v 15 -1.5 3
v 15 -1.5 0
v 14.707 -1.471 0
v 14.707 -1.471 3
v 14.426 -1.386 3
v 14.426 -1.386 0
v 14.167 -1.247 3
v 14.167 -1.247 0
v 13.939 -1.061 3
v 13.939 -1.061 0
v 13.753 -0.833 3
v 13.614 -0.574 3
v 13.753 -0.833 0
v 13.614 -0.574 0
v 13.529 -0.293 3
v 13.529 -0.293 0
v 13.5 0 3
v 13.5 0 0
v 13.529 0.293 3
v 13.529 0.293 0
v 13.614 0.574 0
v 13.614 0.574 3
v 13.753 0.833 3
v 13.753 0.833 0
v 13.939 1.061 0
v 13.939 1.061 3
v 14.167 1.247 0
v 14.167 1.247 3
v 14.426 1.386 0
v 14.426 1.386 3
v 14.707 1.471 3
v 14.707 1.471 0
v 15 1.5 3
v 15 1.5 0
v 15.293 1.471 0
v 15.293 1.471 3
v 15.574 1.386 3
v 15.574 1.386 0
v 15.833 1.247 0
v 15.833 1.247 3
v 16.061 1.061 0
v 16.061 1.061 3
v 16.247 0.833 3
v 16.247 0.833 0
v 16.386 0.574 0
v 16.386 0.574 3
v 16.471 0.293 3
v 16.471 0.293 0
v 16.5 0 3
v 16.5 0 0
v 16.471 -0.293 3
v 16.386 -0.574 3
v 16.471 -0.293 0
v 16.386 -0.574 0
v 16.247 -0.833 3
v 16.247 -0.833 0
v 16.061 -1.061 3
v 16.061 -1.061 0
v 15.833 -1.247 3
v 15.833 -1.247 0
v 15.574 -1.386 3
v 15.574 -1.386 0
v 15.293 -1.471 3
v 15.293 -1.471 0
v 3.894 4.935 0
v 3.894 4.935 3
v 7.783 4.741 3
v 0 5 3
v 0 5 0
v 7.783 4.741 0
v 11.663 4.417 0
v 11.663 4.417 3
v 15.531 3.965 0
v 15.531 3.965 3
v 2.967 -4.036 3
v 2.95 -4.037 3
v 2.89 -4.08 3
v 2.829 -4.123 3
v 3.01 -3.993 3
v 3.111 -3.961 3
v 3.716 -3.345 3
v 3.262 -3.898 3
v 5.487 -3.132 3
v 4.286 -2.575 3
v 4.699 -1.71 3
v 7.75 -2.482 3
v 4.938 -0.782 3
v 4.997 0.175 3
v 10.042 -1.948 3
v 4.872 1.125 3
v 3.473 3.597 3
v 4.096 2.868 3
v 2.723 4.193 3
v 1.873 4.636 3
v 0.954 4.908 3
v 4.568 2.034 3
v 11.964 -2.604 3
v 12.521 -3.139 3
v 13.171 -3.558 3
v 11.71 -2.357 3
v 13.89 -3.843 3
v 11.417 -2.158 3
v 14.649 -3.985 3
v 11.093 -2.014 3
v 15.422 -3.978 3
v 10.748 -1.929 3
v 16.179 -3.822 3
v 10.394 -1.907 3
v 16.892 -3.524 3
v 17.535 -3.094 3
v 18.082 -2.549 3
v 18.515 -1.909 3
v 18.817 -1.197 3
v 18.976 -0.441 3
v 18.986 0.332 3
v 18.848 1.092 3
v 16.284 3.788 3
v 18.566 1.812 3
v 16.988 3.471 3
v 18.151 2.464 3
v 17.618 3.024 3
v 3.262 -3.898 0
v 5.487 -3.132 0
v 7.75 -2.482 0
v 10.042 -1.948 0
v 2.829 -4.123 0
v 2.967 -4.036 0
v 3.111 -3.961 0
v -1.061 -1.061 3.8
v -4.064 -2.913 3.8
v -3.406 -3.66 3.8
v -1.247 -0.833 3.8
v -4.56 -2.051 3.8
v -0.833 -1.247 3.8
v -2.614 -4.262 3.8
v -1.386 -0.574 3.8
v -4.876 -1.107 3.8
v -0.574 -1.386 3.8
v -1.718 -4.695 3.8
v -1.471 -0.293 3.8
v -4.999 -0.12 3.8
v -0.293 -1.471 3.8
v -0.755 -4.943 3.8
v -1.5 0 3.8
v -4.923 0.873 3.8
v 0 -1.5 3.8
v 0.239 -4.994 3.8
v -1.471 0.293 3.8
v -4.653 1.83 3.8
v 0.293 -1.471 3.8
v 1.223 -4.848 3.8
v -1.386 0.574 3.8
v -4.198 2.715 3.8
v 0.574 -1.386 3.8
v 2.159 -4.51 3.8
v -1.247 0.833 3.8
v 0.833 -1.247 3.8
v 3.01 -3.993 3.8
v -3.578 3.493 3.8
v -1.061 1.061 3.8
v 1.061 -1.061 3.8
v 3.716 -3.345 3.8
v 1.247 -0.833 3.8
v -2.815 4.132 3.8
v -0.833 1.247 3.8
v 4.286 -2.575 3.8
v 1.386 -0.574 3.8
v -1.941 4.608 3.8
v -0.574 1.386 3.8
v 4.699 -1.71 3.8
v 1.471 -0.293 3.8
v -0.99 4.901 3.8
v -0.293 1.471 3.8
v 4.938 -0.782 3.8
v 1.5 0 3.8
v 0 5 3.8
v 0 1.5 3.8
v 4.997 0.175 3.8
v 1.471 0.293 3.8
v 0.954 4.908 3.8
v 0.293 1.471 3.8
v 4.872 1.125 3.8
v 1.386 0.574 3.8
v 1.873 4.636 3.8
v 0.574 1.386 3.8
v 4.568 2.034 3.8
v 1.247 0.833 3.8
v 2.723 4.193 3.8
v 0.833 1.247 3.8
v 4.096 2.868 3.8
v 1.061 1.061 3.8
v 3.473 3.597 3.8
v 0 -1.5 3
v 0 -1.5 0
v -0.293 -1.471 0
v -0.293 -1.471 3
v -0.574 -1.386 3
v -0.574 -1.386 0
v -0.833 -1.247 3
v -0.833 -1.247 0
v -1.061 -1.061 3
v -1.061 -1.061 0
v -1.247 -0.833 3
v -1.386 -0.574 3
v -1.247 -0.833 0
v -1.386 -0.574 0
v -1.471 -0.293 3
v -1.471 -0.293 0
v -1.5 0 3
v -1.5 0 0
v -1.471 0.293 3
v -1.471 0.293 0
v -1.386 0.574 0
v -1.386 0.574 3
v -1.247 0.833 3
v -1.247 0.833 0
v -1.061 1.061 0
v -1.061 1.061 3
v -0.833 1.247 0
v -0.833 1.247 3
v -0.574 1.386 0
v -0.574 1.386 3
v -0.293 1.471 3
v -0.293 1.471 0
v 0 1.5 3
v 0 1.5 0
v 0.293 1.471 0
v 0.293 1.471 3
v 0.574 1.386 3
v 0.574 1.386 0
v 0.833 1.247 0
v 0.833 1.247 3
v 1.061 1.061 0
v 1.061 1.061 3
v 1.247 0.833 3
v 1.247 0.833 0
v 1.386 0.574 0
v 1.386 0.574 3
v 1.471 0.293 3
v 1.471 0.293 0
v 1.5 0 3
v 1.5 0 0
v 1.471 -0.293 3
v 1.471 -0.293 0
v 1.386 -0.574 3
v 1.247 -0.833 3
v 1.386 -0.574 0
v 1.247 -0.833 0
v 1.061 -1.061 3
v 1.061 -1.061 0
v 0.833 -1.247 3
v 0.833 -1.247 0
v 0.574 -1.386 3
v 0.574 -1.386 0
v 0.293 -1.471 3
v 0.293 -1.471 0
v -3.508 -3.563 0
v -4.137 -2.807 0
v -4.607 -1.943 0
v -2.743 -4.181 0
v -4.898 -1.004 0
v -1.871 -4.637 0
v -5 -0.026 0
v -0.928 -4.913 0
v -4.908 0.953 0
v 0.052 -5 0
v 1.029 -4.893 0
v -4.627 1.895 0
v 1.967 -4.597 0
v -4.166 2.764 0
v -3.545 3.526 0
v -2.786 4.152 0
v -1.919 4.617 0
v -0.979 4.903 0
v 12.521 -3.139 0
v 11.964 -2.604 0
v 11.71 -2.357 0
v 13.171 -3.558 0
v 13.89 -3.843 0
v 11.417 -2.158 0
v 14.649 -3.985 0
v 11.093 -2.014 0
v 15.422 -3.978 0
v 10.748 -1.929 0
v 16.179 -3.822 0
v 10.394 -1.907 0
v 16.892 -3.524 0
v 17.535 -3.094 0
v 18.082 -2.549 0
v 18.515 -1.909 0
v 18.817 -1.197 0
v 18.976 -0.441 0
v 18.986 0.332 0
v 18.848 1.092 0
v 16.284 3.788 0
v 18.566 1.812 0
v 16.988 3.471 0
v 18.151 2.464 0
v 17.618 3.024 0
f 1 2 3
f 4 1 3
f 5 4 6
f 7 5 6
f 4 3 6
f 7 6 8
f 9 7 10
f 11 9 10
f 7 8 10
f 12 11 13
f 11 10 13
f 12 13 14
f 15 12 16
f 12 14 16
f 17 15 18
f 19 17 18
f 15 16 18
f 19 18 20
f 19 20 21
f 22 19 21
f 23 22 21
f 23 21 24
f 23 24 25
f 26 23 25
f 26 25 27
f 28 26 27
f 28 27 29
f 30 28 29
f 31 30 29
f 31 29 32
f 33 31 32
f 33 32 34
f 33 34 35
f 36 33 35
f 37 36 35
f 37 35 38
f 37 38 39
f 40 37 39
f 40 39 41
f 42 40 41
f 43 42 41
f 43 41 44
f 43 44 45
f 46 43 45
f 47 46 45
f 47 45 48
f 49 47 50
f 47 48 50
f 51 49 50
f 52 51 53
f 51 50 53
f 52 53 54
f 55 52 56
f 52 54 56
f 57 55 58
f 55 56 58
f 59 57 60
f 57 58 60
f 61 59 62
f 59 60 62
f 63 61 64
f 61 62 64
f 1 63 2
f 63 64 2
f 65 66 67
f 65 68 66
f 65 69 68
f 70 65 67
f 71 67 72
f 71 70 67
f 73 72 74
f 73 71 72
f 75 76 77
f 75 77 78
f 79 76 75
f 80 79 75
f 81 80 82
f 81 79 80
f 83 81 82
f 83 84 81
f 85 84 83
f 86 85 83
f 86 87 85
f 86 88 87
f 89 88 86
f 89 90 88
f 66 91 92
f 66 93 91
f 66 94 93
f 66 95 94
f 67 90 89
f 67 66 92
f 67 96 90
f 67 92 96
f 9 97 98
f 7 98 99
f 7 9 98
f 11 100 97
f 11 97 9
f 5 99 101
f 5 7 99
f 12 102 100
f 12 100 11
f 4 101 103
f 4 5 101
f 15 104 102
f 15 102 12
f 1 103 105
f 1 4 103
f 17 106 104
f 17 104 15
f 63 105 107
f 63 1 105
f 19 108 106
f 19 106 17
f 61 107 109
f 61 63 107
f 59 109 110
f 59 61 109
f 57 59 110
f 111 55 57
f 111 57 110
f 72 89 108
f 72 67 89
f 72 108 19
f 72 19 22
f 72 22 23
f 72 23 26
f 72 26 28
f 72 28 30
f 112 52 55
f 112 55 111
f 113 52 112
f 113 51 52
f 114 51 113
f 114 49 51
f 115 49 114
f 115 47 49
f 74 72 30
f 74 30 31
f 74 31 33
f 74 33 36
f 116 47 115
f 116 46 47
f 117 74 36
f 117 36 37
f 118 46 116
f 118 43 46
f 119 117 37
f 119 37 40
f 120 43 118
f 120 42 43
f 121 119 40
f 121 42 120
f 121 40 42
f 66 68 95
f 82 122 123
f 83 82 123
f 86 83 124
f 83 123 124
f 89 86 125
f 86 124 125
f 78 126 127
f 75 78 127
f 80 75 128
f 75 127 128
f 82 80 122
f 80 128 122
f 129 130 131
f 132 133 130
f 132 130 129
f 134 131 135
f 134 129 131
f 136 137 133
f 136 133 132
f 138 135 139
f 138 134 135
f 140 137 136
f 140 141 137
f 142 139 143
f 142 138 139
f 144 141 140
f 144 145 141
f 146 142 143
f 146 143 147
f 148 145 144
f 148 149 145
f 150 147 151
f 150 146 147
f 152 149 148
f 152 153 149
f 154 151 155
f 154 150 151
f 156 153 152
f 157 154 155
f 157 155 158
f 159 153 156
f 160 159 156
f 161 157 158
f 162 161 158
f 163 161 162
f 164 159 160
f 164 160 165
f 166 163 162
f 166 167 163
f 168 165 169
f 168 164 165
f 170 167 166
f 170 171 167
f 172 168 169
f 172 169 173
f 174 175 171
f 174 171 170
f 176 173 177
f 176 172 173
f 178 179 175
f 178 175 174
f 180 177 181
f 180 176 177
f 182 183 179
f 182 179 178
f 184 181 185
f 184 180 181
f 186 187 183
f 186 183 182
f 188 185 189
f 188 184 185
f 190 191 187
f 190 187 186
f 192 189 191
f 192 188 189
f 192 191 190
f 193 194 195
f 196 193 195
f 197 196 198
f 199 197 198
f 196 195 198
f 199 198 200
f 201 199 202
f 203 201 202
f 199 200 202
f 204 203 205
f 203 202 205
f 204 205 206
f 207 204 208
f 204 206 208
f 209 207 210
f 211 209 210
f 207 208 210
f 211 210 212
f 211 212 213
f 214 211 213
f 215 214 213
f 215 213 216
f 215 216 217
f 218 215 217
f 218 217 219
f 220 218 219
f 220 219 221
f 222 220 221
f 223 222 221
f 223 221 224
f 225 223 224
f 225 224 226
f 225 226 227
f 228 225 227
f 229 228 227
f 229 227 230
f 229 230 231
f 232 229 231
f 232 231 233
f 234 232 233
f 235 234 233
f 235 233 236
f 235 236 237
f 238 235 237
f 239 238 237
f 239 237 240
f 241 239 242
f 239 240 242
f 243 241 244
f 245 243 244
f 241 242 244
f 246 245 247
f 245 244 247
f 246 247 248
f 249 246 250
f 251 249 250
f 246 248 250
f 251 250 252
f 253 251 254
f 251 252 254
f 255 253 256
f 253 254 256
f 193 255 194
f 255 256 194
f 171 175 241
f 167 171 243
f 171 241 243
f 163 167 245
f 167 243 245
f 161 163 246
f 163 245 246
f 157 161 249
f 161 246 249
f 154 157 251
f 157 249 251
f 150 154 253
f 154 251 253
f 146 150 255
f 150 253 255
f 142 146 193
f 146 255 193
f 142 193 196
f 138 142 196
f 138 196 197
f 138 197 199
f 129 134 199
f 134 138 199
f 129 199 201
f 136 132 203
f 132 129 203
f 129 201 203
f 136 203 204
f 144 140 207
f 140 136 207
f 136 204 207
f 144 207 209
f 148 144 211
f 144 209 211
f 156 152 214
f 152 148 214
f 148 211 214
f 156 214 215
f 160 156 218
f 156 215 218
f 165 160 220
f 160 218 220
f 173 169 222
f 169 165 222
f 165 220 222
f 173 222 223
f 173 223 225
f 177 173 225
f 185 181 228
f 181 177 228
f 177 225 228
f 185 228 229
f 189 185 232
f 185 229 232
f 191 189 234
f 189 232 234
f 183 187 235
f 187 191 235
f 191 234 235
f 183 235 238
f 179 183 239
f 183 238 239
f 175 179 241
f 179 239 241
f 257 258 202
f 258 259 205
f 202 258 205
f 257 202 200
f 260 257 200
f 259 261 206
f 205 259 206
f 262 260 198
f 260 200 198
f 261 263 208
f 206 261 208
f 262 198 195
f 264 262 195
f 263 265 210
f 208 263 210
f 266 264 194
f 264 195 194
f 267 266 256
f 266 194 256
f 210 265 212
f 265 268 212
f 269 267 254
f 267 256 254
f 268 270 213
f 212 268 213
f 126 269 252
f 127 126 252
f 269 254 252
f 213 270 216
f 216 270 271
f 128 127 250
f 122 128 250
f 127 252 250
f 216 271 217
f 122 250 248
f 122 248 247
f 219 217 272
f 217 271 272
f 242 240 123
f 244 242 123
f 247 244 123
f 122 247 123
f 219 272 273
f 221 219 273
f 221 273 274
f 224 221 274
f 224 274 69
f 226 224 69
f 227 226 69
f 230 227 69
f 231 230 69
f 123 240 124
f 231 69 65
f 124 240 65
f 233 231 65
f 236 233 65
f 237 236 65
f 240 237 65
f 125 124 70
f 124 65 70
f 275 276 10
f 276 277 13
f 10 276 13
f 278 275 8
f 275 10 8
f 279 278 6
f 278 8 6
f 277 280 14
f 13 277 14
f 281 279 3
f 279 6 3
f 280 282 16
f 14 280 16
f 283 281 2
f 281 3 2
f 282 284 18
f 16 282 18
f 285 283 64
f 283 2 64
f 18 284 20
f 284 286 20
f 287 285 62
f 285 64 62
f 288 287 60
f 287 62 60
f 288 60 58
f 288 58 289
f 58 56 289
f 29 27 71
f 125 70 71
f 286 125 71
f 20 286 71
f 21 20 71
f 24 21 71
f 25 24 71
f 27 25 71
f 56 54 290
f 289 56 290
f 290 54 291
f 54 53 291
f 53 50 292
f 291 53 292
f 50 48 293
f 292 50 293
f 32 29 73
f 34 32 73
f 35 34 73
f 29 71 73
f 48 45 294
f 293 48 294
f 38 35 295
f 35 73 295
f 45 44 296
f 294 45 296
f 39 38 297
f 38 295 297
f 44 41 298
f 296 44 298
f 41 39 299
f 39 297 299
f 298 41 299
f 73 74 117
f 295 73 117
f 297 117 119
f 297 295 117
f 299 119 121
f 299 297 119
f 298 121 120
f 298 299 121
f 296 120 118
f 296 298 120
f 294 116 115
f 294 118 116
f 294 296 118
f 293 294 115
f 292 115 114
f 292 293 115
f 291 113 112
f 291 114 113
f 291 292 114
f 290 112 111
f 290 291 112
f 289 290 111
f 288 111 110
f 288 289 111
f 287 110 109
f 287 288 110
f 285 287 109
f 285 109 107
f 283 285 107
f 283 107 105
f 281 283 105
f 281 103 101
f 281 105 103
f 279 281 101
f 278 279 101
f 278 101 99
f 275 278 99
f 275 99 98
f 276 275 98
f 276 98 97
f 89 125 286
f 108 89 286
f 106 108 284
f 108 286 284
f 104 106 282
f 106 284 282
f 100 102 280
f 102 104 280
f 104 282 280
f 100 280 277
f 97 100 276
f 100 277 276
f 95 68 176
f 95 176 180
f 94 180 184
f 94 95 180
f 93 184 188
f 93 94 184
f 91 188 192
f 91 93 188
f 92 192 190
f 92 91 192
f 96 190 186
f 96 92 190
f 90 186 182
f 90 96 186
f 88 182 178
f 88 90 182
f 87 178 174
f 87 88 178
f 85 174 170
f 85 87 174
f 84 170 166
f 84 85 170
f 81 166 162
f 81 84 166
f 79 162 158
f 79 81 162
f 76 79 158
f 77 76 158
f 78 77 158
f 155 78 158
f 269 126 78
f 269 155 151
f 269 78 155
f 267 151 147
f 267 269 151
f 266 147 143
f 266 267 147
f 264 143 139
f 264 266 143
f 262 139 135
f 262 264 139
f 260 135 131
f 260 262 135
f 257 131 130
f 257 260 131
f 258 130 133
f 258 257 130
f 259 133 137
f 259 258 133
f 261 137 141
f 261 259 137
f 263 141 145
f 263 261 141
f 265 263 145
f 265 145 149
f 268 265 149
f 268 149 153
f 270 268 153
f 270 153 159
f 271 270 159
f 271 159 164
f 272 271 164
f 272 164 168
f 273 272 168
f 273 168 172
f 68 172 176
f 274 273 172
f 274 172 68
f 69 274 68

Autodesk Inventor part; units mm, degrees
ref_plane "YZ Plane" through (0, 0, 0) normal (1, 0, 0) x (0, 1, 0)
ref_plane "XZ Plane" through (0, 0, 0) normal (0, 1, 0) x (-1, 0, 0)
ref_plane "XY Plane" through (0, 0, 0) normal (0, 0, 1) x (1, 0, 0)
sketch "Skizze1" plane through (0, 0, 0) normal (0, 0, 1) x (1, 0, 0)
  line L0 (0, 0) -> (15, 0) construction
  arc A0 (0, 5) -> (3.0095, -3.9929) centre (0, 0) ccw
  arc A1 (11.376, -1.693) -> (15.531, 3.9646) centre (15, 0) ccw
  arc A2 (15.531, 3.9646) -> (0, 5) centre (0, -112) ccw
  arc A3 (11.376, -1.693) -> (3.0095, -3.9929) centre (19.3309, -47.0001) ccw
  line L1 (0, -0.0371) -> (0, 5) construction
  dimension "d0" = 15
  dimension "d1" = 5
  dimension "d2" = 1
  dimension "d3" = 4
ref_plane "Arbeitsebene1" through (0, -0.0371, 0) normal (0, 0, -1) x (0, 1, 0)
extrude "Extrusion1" add sketch "Skizze1" along normal blind 3
sketch "Skizze2" plane through (0, 0, 3) normal (0, 0, 1) x (1, 0, 0)
  arc A0 (0, 5) -> (3.0095, -3.9929) centre (0, 0) ccw projected
  arc A1 (11.376, -1.693) -> (15.531, 3.9646) centre (15, 0) ccw projected
hole "Bohrung1" at (0, 0, 3) at (15, 0, 3) direction (0, 0, -1) diameter 3 end through all
sketch "Skizze4" plane through (0, 0, 3) normal (0, 0, 1) x (1, 0, 0)
  arc A0 (0, 5) -> (3.0095, -3.9929) centre (0, 0) ccw projected
  circle A1 centre (0, 0) radius 5
  circle A2 centre (0, 0) radius 1.5 projected
extrude "Extrusion2" add sketch "Skizze4" along normal blind 0.8
fillet "Rundung2" radius 2 2 edges at (3.0095, -3.9929, 1.5) (11.376, -1.693, 1.5)
sketch "Skizze3" plane through (0, 0, 0) normal (0, 0, -1) x (-1, 0, 0)
  circle A0 centre (-4.319, 1.2636) radius 1.5
  arc A1 (-3.0095, -3.9929) -> (0, 5) centre (0, 0) ccw projected
  line L0 (0, 0) -> (-4.319, 1.2636)
  circle A2 centre (0, 0) radius 4.5 construction
  dimension "d25" = 9
equation "\"d0\" = Hebel_basis_2"
equation "\"d3\" = bearingWall"
equation "\"d6\" = bearingHole"
equation "\"FingerLaenge_B\" = 25"
equation "\"Hebel_B\" = 25"
equation "\"FingerWall\" = 3"
equation "\"Finger_diameter\" = 8"
equation "\"Finger_width\" = 22"
equation "\"Hebel_basis_2\" = 15"
equation "\"Join_width\" = 3"
equation "\"bearingHole\" = 3"
equation "\"bearingWall\" = 4"
equation "\"support_D\" = 0.25"
properties part number "Hebel_Basis 2"
